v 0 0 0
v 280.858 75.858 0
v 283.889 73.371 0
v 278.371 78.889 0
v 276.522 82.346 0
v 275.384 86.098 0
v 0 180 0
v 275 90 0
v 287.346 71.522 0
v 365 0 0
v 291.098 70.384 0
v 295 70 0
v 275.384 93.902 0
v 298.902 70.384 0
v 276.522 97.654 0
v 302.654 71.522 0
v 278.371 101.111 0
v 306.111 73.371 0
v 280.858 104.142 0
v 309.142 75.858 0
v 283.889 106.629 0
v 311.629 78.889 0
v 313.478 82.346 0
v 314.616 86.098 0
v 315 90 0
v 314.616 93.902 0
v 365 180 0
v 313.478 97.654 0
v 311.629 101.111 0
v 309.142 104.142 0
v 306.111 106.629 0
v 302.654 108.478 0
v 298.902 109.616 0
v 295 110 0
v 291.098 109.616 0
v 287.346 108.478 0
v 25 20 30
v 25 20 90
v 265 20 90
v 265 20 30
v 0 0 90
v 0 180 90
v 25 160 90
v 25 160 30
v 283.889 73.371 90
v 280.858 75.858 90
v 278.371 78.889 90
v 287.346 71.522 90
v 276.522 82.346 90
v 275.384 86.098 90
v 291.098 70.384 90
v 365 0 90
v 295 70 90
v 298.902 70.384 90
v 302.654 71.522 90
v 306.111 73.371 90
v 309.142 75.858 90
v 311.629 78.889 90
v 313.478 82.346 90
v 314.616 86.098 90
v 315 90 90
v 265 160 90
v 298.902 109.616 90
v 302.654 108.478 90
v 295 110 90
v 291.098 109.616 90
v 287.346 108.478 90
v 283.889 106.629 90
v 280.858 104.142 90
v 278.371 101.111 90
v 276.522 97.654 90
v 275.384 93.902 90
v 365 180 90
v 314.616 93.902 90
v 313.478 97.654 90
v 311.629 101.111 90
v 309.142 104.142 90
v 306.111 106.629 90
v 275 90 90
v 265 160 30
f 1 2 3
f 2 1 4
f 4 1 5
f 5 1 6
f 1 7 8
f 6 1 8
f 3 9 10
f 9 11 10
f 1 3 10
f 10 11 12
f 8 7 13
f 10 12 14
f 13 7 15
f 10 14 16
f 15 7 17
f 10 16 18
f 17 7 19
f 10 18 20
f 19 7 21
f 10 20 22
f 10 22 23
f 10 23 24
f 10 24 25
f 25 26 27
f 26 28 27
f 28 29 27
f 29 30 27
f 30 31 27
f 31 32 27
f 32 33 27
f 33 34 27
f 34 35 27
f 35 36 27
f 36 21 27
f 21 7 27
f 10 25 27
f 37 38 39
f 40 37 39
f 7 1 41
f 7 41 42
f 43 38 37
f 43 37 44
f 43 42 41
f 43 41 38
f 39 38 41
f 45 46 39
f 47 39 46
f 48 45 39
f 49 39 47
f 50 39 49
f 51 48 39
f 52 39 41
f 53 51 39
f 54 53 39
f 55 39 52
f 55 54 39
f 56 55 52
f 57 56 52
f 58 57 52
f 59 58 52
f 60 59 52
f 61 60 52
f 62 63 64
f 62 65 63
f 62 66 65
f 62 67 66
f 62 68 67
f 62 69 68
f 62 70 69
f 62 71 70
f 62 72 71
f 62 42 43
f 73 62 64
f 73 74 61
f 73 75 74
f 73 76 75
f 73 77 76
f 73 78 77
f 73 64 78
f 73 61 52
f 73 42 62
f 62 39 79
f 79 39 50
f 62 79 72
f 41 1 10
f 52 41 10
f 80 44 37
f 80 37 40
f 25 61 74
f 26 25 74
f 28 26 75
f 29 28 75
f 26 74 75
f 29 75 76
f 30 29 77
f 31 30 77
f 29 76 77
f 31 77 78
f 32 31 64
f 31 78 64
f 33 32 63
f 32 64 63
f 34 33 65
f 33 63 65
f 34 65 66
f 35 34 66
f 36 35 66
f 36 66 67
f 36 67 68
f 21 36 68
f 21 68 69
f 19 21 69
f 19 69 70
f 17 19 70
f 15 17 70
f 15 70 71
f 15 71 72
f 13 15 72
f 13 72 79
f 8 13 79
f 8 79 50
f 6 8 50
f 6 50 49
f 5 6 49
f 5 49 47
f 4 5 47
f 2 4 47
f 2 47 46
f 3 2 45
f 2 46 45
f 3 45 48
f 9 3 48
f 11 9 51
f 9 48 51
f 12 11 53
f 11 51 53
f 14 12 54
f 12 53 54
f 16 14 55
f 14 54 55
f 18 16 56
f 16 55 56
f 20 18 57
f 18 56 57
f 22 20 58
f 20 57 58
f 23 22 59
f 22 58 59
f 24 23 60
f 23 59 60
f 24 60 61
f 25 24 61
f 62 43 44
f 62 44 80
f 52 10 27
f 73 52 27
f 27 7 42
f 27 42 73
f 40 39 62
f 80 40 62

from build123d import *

# Parameters (mm, degrees)
F0_W     = 365
F0_H     = 180
F1_DEPTH = 90
F2_W     = 240
F2_H     = 140
F3_DEPTH = 60
F4_R     = 20
F5_DEPTH = 90.001


with BuildPart() as f1:
    # F0 (on Top) → F1 (new body)
    with BuildSketch(Plane.XY):
        with Locations((182.5, 90)):
            Rectangle(F0_W, F0_H)
    extrude(amount=F1_DEPTH)

    # F2 (on face) → F3 (cut)
    with BuildSketch(Plane.XY.offset(90)):
        with Locations((145, 90)):
            Rectangle(F2_W, F2_H)
    extrude(amount=-F3_DEPTH, mode=Mode.SUBTRACT)

    # F4 (on face) → F5 (cut, through all)
    with BuildSketch(Plane.XY.offset(90)):
        with Locations((295, 90)):
            Circle(F4_R)
    extrude(amount=-F5_DEPTH, mode=Mode.SUBTRACT)


solid = f1.part
